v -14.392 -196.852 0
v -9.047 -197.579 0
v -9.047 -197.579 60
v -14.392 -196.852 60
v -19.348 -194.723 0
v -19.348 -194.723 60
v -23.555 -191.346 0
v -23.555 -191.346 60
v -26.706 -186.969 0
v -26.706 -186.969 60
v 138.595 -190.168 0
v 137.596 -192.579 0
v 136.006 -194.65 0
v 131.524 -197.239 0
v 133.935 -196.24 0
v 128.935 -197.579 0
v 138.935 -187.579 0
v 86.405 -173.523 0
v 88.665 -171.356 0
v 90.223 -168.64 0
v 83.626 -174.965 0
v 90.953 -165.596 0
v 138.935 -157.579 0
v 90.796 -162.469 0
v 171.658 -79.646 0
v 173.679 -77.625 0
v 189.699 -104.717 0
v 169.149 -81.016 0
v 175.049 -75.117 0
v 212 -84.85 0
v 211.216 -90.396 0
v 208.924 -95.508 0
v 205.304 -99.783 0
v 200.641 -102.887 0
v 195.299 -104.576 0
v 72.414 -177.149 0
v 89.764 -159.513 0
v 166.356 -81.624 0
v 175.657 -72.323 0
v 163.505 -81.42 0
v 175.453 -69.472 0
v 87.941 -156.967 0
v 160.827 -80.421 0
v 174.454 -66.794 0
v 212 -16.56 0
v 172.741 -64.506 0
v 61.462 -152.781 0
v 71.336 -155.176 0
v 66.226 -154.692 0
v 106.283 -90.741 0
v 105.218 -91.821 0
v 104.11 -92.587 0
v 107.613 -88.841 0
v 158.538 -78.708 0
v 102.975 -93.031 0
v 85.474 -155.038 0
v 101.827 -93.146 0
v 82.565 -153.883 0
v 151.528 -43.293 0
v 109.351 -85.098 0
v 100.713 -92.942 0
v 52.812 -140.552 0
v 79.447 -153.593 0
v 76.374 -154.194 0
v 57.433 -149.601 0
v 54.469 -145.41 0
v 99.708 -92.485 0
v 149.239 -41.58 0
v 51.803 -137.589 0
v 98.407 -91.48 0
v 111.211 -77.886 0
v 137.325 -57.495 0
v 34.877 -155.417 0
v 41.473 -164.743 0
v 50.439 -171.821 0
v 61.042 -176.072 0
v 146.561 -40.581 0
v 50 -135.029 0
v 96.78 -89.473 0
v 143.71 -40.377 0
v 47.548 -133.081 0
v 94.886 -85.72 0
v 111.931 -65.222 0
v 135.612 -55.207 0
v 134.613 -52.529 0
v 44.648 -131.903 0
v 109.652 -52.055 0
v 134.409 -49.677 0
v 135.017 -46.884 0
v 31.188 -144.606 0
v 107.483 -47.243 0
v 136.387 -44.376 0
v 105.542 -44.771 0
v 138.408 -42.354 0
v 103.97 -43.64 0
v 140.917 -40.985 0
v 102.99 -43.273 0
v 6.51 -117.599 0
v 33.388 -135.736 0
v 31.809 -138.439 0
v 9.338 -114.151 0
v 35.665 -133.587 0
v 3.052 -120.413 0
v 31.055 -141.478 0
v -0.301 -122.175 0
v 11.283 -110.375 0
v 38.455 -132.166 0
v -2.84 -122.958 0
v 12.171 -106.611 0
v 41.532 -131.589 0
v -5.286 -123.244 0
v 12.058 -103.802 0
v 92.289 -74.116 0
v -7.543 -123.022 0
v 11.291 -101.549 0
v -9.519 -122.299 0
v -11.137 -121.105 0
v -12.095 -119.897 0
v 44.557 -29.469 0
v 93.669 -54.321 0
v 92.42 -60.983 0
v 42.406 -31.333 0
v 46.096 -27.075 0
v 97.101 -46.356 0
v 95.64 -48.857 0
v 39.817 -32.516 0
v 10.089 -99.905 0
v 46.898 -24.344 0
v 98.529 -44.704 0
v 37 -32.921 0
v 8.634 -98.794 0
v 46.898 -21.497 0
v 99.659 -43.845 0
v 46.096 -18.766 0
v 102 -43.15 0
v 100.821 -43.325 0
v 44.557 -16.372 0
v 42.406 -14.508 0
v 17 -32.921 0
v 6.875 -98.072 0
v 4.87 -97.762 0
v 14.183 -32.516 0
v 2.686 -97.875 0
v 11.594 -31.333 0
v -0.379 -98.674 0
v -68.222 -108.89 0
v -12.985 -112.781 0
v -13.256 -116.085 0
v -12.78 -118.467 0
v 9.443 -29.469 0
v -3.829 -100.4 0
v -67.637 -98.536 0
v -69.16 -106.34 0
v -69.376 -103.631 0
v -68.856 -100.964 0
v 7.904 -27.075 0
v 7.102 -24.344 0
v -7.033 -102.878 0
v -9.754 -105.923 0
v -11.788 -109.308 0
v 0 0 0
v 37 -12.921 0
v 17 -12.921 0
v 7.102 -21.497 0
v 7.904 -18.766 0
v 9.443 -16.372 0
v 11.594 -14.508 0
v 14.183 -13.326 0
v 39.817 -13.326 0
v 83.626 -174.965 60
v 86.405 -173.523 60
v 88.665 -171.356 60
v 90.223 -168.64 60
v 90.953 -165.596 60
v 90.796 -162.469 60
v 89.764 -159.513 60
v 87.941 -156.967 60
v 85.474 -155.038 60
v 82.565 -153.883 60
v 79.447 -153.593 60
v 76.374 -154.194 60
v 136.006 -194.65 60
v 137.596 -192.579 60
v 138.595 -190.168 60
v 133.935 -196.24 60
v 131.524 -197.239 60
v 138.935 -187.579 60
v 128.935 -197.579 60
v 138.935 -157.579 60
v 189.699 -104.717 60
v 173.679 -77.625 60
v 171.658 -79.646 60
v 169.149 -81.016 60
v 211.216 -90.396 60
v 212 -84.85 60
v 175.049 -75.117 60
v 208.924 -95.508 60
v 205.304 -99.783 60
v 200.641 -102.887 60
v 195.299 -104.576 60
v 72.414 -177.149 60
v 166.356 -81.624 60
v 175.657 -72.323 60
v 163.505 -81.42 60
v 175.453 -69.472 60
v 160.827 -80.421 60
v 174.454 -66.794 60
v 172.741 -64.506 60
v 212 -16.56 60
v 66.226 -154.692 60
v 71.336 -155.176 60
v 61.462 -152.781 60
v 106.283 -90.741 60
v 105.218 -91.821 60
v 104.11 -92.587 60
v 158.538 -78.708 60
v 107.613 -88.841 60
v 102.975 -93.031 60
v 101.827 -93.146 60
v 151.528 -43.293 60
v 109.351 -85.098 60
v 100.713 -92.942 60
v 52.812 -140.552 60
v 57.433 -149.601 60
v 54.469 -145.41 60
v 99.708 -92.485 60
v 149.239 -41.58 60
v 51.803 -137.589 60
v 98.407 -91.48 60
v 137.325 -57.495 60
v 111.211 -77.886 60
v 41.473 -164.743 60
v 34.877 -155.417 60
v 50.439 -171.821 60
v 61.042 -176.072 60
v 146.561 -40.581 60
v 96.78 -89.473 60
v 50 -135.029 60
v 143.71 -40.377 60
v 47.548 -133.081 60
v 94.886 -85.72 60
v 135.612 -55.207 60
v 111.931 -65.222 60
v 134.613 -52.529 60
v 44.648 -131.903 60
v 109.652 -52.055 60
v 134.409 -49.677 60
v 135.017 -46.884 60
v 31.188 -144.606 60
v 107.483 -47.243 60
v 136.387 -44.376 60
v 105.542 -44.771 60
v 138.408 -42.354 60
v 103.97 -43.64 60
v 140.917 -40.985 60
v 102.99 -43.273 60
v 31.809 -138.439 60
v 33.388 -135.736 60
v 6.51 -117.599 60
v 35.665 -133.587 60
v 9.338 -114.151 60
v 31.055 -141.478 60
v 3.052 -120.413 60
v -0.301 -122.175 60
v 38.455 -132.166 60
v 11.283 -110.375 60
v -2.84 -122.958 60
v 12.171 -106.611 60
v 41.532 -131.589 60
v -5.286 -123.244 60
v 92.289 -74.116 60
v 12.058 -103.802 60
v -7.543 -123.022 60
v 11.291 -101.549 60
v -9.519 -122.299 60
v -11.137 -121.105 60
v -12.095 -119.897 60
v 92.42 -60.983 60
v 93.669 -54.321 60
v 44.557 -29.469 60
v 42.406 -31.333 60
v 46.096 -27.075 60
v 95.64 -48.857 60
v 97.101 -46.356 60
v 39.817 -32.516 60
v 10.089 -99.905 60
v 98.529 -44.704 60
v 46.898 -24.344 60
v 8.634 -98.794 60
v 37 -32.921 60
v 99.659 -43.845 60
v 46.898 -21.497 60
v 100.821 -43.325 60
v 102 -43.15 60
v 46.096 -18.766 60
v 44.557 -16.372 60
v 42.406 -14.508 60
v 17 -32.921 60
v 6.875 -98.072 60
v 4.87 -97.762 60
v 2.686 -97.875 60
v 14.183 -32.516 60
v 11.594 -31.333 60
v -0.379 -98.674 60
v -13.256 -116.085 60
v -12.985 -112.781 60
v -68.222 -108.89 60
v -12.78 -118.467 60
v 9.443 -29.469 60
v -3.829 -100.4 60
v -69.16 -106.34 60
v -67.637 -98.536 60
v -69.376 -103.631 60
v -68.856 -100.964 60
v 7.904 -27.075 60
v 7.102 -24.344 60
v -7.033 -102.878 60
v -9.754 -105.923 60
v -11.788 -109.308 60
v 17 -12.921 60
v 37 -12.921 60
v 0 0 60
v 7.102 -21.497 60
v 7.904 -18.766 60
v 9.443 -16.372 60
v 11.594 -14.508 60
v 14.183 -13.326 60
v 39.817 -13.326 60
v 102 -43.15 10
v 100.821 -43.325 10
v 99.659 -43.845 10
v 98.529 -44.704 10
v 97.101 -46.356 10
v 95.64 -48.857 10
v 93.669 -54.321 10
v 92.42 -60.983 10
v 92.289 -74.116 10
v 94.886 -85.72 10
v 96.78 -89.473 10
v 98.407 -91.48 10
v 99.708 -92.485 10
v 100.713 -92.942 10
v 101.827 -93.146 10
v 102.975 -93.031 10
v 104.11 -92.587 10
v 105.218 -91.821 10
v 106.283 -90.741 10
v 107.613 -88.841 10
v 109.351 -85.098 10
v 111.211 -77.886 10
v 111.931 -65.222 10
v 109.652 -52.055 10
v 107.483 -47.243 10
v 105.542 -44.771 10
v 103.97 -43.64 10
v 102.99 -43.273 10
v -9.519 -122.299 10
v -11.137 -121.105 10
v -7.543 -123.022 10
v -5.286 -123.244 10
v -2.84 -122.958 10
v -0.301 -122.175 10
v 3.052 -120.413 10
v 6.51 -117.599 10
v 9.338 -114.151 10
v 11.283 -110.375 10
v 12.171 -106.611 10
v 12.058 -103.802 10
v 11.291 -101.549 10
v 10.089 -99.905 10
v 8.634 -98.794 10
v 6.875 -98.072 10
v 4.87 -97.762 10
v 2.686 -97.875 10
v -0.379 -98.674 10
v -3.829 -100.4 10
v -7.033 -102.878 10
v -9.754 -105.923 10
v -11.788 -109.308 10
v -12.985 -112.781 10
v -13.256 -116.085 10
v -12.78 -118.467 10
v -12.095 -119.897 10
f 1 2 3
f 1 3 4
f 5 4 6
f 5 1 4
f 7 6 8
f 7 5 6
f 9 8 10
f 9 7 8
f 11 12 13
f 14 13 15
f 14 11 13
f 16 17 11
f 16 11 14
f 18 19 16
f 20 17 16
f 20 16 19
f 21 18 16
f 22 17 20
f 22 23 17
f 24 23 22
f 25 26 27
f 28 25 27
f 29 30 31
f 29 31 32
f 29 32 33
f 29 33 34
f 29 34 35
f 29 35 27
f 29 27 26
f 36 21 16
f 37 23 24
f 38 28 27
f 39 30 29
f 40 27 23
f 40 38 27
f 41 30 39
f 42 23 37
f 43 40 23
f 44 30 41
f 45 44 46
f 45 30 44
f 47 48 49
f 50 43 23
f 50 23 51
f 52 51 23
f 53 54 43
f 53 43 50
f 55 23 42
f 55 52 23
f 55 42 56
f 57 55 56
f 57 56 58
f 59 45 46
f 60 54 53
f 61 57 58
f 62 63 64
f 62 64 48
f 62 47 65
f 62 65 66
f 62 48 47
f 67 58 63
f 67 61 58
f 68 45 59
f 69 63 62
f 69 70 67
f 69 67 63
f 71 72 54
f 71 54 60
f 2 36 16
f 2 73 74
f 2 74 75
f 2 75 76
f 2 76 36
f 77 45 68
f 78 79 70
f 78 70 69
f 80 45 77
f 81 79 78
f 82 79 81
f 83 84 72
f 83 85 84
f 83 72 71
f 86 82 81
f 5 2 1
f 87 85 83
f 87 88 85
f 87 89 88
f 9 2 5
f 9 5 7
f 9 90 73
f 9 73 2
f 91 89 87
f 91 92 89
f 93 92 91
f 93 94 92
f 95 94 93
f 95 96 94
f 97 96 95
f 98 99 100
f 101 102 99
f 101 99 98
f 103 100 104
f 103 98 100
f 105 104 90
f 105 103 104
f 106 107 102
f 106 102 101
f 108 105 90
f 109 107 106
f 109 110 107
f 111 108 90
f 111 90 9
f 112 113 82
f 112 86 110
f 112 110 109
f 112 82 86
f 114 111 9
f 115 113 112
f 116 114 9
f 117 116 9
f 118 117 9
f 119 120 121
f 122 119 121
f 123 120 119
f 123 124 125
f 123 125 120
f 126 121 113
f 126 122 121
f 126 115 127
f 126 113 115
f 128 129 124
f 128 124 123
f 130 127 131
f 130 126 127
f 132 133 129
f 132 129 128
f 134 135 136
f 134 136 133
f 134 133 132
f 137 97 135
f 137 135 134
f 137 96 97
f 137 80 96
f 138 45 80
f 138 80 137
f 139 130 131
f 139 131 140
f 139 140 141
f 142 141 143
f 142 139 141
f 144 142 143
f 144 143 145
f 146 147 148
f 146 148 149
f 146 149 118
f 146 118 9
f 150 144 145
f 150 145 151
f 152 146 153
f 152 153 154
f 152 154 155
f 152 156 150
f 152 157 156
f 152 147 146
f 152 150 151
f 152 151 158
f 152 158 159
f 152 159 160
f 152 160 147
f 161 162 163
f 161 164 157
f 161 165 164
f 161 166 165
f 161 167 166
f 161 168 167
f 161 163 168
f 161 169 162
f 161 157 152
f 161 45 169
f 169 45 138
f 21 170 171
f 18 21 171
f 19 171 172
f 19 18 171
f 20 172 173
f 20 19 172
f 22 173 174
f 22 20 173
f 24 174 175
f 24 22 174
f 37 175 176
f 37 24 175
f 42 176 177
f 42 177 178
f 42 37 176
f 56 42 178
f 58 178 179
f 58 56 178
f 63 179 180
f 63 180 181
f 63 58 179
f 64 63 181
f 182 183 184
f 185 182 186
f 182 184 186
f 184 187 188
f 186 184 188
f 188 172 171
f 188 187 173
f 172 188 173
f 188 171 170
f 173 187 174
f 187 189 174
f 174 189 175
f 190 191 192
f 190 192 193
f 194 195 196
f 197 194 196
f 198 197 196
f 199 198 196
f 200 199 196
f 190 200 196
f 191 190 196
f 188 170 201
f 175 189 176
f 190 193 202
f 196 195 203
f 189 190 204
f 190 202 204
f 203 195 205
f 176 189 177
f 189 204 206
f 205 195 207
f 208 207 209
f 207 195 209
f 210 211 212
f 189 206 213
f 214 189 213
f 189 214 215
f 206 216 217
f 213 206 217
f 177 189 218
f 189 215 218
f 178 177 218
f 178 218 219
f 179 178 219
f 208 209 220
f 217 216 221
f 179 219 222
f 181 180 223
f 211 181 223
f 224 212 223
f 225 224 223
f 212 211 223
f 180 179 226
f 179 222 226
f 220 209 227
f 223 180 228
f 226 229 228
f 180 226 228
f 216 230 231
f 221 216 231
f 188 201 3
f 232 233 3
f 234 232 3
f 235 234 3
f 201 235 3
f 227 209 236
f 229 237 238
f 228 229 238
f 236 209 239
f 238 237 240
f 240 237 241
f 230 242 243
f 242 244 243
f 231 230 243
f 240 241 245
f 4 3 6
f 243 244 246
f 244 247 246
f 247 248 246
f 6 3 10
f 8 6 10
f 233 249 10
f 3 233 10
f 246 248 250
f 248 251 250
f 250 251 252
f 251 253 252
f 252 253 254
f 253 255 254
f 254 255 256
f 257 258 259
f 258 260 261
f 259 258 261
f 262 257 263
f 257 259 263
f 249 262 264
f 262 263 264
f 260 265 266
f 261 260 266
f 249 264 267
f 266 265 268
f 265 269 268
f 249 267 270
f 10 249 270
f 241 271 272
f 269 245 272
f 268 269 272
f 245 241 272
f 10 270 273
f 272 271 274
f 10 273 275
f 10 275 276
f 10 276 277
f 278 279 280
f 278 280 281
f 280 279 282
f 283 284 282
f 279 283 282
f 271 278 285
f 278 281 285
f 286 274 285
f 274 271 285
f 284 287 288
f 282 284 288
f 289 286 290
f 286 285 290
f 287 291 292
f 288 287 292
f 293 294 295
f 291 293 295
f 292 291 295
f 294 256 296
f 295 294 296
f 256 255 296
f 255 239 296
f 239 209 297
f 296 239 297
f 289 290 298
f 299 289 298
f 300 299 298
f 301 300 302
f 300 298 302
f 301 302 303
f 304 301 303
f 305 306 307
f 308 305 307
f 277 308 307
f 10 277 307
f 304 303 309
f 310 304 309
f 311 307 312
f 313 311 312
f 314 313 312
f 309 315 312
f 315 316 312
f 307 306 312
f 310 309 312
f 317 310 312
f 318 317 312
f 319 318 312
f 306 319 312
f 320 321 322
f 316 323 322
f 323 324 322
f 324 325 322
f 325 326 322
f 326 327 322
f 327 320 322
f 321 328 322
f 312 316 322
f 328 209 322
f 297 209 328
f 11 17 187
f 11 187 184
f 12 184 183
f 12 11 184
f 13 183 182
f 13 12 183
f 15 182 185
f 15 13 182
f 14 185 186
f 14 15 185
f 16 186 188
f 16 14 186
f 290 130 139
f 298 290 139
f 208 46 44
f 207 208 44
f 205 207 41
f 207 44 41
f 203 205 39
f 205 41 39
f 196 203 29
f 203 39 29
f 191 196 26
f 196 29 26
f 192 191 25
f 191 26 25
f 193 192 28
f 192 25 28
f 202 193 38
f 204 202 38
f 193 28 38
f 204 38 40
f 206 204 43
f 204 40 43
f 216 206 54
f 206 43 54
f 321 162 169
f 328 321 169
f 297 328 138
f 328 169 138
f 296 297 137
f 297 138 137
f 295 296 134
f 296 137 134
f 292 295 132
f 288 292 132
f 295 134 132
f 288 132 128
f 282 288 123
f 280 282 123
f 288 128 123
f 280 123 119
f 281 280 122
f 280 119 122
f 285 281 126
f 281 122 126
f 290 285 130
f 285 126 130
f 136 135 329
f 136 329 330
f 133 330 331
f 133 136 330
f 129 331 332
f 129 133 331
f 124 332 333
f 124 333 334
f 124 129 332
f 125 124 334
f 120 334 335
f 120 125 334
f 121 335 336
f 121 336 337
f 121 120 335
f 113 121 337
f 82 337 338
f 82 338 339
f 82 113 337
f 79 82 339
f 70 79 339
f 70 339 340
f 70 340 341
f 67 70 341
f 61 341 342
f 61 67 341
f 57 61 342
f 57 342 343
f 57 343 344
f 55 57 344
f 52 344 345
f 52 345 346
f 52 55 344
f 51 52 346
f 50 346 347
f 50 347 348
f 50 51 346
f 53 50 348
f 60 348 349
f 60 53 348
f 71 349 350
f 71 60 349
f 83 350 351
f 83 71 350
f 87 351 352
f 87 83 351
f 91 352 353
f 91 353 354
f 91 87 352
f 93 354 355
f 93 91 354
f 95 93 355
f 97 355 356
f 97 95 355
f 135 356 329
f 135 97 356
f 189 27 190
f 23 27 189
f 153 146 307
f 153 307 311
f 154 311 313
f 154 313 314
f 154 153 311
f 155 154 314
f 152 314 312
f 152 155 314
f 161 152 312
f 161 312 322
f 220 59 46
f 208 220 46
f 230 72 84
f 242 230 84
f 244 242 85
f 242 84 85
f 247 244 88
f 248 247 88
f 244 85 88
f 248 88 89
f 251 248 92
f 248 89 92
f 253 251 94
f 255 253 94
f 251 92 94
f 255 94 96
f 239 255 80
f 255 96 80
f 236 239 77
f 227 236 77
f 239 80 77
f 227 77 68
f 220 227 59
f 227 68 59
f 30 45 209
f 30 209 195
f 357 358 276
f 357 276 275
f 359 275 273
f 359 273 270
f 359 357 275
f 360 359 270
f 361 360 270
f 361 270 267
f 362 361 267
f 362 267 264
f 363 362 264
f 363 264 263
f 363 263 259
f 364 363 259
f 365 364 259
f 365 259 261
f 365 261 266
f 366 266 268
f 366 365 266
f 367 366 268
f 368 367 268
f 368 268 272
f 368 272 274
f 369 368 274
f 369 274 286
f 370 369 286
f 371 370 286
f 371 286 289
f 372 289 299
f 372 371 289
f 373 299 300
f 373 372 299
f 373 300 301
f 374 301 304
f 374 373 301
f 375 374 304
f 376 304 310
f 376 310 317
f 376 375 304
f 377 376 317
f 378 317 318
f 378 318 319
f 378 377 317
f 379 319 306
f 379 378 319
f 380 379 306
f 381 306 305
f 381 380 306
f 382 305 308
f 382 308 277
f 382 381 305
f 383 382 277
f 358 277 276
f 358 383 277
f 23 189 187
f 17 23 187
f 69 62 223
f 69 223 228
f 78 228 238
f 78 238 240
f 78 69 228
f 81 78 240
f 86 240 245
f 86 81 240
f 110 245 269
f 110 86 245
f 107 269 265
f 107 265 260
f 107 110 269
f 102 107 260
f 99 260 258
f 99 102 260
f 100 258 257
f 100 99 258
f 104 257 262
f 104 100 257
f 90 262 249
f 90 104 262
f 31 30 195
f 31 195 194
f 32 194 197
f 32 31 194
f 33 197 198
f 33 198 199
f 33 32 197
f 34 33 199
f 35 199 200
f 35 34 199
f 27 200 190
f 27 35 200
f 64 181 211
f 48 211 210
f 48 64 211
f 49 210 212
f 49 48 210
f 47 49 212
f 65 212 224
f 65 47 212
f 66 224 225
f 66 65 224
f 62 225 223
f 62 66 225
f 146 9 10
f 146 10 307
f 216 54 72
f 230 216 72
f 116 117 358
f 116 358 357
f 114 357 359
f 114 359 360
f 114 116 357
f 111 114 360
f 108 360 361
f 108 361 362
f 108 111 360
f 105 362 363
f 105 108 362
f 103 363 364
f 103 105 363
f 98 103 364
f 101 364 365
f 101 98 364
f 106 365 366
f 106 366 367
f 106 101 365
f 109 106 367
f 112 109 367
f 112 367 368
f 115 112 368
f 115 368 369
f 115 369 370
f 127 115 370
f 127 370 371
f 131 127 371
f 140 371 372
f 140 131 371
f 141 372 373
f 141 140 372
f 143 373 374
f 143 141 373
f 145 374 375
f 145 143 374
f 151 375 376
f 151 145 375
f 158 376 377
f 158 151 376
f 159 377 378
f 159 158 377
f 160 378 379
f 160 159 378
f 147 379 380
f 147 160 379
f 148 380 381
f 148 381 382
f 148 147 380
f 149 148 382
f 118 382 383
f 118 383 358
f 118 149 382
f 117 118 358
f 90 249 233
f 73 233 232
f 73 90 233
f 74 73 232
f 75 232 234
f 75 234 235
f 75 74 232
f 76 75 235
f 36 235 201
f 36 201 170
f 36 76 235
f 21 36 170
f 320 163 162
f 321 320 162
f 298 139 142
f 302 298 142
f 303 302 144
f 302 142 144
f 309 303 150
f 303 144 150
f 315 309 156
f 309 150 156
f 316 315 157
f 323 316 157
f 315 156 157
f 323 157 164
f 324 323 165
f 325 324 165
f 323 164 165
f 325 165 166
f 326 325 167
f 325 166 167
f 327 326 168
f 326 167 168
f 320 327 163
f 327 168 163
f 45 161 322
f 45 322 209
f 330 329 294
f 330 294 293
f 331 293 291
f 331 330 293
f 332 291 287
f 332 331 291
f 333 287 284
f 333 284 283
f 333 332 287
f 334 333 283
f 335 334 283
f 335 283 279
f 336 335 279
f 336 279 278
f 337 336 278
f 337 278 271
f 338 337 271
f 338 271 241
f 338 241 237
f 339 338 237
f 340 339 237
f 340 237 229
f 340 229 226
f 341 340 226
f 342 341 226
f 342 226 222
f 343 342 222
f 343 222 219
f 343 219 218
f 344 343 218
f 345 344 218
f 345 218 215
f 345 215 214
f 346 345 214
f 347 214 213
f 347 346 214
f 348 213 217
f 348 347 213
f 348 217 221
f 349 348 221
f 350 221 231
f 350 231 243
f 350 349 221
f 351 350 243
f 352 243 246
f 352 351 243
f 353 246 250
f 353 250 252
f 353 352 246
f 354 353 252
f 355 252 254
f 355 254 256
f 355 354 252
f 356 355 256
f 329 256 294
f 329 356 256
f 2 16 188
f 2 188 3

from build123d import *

# Parameters (mm, degrees)
SKETCH_3_RX     = 15
SKETCH_3_RY     = 10
SKETCH_3_RX_2   = 25
EXTRUDE_1_DEPTH = 10
SKETCH_3_3_RX   = 15
SKETCH_3_3_RY   = 10
SKETCH_3_3_RX_2 = 25
EXTRUDE_2_DEPTH = 60


with BuildPart() as part:
    # 草图3 → 凸台-拉伸1 (new body)
    with BuildSketch(Plane.XY):
        with BuildLine():
            Line((0, 0), (212, -16.559778275))
            Line((212, -16.559778275), (212, -84.849778275))
            ThreePointArc((212, -84.849778275), (205.303937337, -99.783138625), (189.699474868, -104.717027308))
            Line((189.699474868, -104.717027308), (138.935384383, -157.579407289))
            Line((138.935384383, -157.579407289), (138.935384383, -187.579407289))
            ThreePointArc((138.935384383, -187.579407289), (136.006452195, -194.650475101), (128.935384383, -197.579407289))
            Line((128.935384383, -197.579407289), (-9.047403236, -197.579407289))
            ThreePointArc((-9.047403236, -197.579407289), (-19.348164734, -194.722753304), (-26.706355093, -186.968838545))
            Line((-26.706355093, -186.968838545), (-68.22172539, -108.889782909))
            ThreePointArc((-68.22172539, -108.889782909), (-69.376331833, -103.631064432), (-67.636828751, -98.535834793))
            Line((-67.636828751, -98.535834793), (0, 0))
        make_face()
        with Locations(Location((-0.530483272, -110.497923763), (0, 0, -135))):
            Ellipse(SKETCH_3_RX, SKETCH_3_RY, mode=Mode.SUBTRACT)
        with Locations(Location((102, -68.15020742), (0, 0, 90))):
            Ellipse(SKETCH_3_RX_2, SKETCH_3_RY, mode=Mode.SUBTRACT)
        with BuildLine():
            Line((17, -12.920611137), (37, -12.920611137))
            ThreePointArc((37, -12.920611137), (47, -22.920611137), (37, -32.920611137))
            Line((37, -32.920611137), (17, -32.920611137))
            ThreePointArc((17, -32.920611137), (7, -22.920611137), (17, -12.920611137))
        make_face(mode=Mode.SUBTRACT)
        with BuildLine():
            Line((151.527534094, -43.292720139), (172.74073753, -64.505923575))
            ThreePointArc((172.74073753, -64.505923575), (172.74073753, -78.708178021), (158.538483084, -78.708178021))
            Line((158.538483084, -78.708178021), (137.325279648, -57.494974585))
            ThreePointArc((137.325279648, -57.494974585), (137.325279648, -43.292720139), (151.527534094, -43.292720139))
        make_face(mode=Mode.SUBTRACT)
        with BuildLine():
            ThreePointArc((31.188356134, -144.606315506), (50.439261207, -171.820683387), (83.625615961, -174.96472909))
            ThreePointArc((83.625615961, -174.96472909), (90.385321801, -160.953791328), (76.374384039, -154.194085489))
            ThreePointArc((76.374384039, -154.194085489), (61.462059159, -152.781305107), (52.811643866, -140.552499073))
            ThreePointArc((52.811643866, -140.552499073), (39.973091784, -131.767763424), (31.188356134, -144.606315506))
        make_face(mode=Mode.SUBTRACT)
    extrude(amount=EXTRUDE_1_DEPTH)

    # 草图3<3> → 凸台-拉伸2 (add)
    with BuildSketch(Plane.XY):
        with BuildLine():
            Line((0, 0), (212, -16.559778275))
            Line((212, -16.559778275), (212, -84.849778275))
            ThreePointArc((212, -84.849778275), (205.303937337, -99.783138625), (189.699474868, -104.717027308))
            Line((189.699474868, -104.717027308), (138.935384383, -157.579407289))
            Line((138.935384383, -157.579407289), (138.935384383, -187.579407289))
            ThreePointArc((138.935384383, -187.579407289), (136.006452195, -194.650475101), (128.935384383, -197.579407289))
            Line((128.935384383, -197.579407289), (-9.047403236, -197.579407289))
            ThreePointArc((-9.047403236, -197.579407289), (-19.348164734, -194.722753304), (-26.706355093, -186.968838545))
            Line((-26.706355093, -186.968838545), (-68.22172539, -108.889782909))
            ThreePointArc((-68.22172539, -108.889782909), (-69.376331833, -103.631064432), (-67.636828751, -98.535834793))
            Line((-67.636828751, -98.535834793), (0, 0))
        make_face()
        with Locations(Location((-0.530483272, -110.497923763), (0, 0, -135))):
            Ellipse(SKETCH_3_3_RX, SKETCH_3_3_RY, mode=Mode.SUBTRACT)
        with Locations(Location((102, -68.15020742), (0, 0, 90))):
            Ellipse(SKETCH_3_3_RX_2, SKETCH_3_3_RY, mode=Mode.SUBTRACT)
        with BuildLine():
            Line((17, -12.920611137), (37, -12.920611137))
            ThreePointArc((37, -12.920611137), (47, -22.920611137), (37, -32.920611137))
            Line((37, -32.920611137), (17, -32.920611137))
            ThreePointArc((17, -32.920611137), (7, -22.920611137), (17, -12.920611137))
        make_face(mode=Mode.SUBTRACT)
        with BuildLine():
            Line((151.527534094, -43.292720139), (172.74073753, -64.505923575))
            ThreePointArc((172.74073753, -64.505923575), (172.74073753, -78.708178021), (158.538483084, -78.708178021))
            Line((158.538483084, -78.708178021), (137.325279648, -57.494974585))
            ThreePointArc((137.325279648, -57.494974585), (137.325279648, -43.292720139), (151.527534094, -43.292720139))
        make_face(mode=Mode.SUBTRACT)
        with BuildLine():
            ThreePointArc((31.188356134, -144.606315506), (50.439261207, -171.820683387), (83.625615961, -174.96472909))
            ThreePointArc((83.625615961, -174.96472909), (90.385321801, -160.953791328), (76.374384039, -154.194085489))
            ThreePointArc((76.374384039, -154.194085489), (61.462059159, -152.781305107), (52.811643866, -140.552499073))
            ThreePointArc((52.811643866, -140.552499073), (39.973091784, -131.767763424), (31.188356134, -144.606315506))
        make_face(mode=Mode.SUBTRACT)
    extrude(amount=EXTRUDE_2_DEPTH)


solid = part.part
